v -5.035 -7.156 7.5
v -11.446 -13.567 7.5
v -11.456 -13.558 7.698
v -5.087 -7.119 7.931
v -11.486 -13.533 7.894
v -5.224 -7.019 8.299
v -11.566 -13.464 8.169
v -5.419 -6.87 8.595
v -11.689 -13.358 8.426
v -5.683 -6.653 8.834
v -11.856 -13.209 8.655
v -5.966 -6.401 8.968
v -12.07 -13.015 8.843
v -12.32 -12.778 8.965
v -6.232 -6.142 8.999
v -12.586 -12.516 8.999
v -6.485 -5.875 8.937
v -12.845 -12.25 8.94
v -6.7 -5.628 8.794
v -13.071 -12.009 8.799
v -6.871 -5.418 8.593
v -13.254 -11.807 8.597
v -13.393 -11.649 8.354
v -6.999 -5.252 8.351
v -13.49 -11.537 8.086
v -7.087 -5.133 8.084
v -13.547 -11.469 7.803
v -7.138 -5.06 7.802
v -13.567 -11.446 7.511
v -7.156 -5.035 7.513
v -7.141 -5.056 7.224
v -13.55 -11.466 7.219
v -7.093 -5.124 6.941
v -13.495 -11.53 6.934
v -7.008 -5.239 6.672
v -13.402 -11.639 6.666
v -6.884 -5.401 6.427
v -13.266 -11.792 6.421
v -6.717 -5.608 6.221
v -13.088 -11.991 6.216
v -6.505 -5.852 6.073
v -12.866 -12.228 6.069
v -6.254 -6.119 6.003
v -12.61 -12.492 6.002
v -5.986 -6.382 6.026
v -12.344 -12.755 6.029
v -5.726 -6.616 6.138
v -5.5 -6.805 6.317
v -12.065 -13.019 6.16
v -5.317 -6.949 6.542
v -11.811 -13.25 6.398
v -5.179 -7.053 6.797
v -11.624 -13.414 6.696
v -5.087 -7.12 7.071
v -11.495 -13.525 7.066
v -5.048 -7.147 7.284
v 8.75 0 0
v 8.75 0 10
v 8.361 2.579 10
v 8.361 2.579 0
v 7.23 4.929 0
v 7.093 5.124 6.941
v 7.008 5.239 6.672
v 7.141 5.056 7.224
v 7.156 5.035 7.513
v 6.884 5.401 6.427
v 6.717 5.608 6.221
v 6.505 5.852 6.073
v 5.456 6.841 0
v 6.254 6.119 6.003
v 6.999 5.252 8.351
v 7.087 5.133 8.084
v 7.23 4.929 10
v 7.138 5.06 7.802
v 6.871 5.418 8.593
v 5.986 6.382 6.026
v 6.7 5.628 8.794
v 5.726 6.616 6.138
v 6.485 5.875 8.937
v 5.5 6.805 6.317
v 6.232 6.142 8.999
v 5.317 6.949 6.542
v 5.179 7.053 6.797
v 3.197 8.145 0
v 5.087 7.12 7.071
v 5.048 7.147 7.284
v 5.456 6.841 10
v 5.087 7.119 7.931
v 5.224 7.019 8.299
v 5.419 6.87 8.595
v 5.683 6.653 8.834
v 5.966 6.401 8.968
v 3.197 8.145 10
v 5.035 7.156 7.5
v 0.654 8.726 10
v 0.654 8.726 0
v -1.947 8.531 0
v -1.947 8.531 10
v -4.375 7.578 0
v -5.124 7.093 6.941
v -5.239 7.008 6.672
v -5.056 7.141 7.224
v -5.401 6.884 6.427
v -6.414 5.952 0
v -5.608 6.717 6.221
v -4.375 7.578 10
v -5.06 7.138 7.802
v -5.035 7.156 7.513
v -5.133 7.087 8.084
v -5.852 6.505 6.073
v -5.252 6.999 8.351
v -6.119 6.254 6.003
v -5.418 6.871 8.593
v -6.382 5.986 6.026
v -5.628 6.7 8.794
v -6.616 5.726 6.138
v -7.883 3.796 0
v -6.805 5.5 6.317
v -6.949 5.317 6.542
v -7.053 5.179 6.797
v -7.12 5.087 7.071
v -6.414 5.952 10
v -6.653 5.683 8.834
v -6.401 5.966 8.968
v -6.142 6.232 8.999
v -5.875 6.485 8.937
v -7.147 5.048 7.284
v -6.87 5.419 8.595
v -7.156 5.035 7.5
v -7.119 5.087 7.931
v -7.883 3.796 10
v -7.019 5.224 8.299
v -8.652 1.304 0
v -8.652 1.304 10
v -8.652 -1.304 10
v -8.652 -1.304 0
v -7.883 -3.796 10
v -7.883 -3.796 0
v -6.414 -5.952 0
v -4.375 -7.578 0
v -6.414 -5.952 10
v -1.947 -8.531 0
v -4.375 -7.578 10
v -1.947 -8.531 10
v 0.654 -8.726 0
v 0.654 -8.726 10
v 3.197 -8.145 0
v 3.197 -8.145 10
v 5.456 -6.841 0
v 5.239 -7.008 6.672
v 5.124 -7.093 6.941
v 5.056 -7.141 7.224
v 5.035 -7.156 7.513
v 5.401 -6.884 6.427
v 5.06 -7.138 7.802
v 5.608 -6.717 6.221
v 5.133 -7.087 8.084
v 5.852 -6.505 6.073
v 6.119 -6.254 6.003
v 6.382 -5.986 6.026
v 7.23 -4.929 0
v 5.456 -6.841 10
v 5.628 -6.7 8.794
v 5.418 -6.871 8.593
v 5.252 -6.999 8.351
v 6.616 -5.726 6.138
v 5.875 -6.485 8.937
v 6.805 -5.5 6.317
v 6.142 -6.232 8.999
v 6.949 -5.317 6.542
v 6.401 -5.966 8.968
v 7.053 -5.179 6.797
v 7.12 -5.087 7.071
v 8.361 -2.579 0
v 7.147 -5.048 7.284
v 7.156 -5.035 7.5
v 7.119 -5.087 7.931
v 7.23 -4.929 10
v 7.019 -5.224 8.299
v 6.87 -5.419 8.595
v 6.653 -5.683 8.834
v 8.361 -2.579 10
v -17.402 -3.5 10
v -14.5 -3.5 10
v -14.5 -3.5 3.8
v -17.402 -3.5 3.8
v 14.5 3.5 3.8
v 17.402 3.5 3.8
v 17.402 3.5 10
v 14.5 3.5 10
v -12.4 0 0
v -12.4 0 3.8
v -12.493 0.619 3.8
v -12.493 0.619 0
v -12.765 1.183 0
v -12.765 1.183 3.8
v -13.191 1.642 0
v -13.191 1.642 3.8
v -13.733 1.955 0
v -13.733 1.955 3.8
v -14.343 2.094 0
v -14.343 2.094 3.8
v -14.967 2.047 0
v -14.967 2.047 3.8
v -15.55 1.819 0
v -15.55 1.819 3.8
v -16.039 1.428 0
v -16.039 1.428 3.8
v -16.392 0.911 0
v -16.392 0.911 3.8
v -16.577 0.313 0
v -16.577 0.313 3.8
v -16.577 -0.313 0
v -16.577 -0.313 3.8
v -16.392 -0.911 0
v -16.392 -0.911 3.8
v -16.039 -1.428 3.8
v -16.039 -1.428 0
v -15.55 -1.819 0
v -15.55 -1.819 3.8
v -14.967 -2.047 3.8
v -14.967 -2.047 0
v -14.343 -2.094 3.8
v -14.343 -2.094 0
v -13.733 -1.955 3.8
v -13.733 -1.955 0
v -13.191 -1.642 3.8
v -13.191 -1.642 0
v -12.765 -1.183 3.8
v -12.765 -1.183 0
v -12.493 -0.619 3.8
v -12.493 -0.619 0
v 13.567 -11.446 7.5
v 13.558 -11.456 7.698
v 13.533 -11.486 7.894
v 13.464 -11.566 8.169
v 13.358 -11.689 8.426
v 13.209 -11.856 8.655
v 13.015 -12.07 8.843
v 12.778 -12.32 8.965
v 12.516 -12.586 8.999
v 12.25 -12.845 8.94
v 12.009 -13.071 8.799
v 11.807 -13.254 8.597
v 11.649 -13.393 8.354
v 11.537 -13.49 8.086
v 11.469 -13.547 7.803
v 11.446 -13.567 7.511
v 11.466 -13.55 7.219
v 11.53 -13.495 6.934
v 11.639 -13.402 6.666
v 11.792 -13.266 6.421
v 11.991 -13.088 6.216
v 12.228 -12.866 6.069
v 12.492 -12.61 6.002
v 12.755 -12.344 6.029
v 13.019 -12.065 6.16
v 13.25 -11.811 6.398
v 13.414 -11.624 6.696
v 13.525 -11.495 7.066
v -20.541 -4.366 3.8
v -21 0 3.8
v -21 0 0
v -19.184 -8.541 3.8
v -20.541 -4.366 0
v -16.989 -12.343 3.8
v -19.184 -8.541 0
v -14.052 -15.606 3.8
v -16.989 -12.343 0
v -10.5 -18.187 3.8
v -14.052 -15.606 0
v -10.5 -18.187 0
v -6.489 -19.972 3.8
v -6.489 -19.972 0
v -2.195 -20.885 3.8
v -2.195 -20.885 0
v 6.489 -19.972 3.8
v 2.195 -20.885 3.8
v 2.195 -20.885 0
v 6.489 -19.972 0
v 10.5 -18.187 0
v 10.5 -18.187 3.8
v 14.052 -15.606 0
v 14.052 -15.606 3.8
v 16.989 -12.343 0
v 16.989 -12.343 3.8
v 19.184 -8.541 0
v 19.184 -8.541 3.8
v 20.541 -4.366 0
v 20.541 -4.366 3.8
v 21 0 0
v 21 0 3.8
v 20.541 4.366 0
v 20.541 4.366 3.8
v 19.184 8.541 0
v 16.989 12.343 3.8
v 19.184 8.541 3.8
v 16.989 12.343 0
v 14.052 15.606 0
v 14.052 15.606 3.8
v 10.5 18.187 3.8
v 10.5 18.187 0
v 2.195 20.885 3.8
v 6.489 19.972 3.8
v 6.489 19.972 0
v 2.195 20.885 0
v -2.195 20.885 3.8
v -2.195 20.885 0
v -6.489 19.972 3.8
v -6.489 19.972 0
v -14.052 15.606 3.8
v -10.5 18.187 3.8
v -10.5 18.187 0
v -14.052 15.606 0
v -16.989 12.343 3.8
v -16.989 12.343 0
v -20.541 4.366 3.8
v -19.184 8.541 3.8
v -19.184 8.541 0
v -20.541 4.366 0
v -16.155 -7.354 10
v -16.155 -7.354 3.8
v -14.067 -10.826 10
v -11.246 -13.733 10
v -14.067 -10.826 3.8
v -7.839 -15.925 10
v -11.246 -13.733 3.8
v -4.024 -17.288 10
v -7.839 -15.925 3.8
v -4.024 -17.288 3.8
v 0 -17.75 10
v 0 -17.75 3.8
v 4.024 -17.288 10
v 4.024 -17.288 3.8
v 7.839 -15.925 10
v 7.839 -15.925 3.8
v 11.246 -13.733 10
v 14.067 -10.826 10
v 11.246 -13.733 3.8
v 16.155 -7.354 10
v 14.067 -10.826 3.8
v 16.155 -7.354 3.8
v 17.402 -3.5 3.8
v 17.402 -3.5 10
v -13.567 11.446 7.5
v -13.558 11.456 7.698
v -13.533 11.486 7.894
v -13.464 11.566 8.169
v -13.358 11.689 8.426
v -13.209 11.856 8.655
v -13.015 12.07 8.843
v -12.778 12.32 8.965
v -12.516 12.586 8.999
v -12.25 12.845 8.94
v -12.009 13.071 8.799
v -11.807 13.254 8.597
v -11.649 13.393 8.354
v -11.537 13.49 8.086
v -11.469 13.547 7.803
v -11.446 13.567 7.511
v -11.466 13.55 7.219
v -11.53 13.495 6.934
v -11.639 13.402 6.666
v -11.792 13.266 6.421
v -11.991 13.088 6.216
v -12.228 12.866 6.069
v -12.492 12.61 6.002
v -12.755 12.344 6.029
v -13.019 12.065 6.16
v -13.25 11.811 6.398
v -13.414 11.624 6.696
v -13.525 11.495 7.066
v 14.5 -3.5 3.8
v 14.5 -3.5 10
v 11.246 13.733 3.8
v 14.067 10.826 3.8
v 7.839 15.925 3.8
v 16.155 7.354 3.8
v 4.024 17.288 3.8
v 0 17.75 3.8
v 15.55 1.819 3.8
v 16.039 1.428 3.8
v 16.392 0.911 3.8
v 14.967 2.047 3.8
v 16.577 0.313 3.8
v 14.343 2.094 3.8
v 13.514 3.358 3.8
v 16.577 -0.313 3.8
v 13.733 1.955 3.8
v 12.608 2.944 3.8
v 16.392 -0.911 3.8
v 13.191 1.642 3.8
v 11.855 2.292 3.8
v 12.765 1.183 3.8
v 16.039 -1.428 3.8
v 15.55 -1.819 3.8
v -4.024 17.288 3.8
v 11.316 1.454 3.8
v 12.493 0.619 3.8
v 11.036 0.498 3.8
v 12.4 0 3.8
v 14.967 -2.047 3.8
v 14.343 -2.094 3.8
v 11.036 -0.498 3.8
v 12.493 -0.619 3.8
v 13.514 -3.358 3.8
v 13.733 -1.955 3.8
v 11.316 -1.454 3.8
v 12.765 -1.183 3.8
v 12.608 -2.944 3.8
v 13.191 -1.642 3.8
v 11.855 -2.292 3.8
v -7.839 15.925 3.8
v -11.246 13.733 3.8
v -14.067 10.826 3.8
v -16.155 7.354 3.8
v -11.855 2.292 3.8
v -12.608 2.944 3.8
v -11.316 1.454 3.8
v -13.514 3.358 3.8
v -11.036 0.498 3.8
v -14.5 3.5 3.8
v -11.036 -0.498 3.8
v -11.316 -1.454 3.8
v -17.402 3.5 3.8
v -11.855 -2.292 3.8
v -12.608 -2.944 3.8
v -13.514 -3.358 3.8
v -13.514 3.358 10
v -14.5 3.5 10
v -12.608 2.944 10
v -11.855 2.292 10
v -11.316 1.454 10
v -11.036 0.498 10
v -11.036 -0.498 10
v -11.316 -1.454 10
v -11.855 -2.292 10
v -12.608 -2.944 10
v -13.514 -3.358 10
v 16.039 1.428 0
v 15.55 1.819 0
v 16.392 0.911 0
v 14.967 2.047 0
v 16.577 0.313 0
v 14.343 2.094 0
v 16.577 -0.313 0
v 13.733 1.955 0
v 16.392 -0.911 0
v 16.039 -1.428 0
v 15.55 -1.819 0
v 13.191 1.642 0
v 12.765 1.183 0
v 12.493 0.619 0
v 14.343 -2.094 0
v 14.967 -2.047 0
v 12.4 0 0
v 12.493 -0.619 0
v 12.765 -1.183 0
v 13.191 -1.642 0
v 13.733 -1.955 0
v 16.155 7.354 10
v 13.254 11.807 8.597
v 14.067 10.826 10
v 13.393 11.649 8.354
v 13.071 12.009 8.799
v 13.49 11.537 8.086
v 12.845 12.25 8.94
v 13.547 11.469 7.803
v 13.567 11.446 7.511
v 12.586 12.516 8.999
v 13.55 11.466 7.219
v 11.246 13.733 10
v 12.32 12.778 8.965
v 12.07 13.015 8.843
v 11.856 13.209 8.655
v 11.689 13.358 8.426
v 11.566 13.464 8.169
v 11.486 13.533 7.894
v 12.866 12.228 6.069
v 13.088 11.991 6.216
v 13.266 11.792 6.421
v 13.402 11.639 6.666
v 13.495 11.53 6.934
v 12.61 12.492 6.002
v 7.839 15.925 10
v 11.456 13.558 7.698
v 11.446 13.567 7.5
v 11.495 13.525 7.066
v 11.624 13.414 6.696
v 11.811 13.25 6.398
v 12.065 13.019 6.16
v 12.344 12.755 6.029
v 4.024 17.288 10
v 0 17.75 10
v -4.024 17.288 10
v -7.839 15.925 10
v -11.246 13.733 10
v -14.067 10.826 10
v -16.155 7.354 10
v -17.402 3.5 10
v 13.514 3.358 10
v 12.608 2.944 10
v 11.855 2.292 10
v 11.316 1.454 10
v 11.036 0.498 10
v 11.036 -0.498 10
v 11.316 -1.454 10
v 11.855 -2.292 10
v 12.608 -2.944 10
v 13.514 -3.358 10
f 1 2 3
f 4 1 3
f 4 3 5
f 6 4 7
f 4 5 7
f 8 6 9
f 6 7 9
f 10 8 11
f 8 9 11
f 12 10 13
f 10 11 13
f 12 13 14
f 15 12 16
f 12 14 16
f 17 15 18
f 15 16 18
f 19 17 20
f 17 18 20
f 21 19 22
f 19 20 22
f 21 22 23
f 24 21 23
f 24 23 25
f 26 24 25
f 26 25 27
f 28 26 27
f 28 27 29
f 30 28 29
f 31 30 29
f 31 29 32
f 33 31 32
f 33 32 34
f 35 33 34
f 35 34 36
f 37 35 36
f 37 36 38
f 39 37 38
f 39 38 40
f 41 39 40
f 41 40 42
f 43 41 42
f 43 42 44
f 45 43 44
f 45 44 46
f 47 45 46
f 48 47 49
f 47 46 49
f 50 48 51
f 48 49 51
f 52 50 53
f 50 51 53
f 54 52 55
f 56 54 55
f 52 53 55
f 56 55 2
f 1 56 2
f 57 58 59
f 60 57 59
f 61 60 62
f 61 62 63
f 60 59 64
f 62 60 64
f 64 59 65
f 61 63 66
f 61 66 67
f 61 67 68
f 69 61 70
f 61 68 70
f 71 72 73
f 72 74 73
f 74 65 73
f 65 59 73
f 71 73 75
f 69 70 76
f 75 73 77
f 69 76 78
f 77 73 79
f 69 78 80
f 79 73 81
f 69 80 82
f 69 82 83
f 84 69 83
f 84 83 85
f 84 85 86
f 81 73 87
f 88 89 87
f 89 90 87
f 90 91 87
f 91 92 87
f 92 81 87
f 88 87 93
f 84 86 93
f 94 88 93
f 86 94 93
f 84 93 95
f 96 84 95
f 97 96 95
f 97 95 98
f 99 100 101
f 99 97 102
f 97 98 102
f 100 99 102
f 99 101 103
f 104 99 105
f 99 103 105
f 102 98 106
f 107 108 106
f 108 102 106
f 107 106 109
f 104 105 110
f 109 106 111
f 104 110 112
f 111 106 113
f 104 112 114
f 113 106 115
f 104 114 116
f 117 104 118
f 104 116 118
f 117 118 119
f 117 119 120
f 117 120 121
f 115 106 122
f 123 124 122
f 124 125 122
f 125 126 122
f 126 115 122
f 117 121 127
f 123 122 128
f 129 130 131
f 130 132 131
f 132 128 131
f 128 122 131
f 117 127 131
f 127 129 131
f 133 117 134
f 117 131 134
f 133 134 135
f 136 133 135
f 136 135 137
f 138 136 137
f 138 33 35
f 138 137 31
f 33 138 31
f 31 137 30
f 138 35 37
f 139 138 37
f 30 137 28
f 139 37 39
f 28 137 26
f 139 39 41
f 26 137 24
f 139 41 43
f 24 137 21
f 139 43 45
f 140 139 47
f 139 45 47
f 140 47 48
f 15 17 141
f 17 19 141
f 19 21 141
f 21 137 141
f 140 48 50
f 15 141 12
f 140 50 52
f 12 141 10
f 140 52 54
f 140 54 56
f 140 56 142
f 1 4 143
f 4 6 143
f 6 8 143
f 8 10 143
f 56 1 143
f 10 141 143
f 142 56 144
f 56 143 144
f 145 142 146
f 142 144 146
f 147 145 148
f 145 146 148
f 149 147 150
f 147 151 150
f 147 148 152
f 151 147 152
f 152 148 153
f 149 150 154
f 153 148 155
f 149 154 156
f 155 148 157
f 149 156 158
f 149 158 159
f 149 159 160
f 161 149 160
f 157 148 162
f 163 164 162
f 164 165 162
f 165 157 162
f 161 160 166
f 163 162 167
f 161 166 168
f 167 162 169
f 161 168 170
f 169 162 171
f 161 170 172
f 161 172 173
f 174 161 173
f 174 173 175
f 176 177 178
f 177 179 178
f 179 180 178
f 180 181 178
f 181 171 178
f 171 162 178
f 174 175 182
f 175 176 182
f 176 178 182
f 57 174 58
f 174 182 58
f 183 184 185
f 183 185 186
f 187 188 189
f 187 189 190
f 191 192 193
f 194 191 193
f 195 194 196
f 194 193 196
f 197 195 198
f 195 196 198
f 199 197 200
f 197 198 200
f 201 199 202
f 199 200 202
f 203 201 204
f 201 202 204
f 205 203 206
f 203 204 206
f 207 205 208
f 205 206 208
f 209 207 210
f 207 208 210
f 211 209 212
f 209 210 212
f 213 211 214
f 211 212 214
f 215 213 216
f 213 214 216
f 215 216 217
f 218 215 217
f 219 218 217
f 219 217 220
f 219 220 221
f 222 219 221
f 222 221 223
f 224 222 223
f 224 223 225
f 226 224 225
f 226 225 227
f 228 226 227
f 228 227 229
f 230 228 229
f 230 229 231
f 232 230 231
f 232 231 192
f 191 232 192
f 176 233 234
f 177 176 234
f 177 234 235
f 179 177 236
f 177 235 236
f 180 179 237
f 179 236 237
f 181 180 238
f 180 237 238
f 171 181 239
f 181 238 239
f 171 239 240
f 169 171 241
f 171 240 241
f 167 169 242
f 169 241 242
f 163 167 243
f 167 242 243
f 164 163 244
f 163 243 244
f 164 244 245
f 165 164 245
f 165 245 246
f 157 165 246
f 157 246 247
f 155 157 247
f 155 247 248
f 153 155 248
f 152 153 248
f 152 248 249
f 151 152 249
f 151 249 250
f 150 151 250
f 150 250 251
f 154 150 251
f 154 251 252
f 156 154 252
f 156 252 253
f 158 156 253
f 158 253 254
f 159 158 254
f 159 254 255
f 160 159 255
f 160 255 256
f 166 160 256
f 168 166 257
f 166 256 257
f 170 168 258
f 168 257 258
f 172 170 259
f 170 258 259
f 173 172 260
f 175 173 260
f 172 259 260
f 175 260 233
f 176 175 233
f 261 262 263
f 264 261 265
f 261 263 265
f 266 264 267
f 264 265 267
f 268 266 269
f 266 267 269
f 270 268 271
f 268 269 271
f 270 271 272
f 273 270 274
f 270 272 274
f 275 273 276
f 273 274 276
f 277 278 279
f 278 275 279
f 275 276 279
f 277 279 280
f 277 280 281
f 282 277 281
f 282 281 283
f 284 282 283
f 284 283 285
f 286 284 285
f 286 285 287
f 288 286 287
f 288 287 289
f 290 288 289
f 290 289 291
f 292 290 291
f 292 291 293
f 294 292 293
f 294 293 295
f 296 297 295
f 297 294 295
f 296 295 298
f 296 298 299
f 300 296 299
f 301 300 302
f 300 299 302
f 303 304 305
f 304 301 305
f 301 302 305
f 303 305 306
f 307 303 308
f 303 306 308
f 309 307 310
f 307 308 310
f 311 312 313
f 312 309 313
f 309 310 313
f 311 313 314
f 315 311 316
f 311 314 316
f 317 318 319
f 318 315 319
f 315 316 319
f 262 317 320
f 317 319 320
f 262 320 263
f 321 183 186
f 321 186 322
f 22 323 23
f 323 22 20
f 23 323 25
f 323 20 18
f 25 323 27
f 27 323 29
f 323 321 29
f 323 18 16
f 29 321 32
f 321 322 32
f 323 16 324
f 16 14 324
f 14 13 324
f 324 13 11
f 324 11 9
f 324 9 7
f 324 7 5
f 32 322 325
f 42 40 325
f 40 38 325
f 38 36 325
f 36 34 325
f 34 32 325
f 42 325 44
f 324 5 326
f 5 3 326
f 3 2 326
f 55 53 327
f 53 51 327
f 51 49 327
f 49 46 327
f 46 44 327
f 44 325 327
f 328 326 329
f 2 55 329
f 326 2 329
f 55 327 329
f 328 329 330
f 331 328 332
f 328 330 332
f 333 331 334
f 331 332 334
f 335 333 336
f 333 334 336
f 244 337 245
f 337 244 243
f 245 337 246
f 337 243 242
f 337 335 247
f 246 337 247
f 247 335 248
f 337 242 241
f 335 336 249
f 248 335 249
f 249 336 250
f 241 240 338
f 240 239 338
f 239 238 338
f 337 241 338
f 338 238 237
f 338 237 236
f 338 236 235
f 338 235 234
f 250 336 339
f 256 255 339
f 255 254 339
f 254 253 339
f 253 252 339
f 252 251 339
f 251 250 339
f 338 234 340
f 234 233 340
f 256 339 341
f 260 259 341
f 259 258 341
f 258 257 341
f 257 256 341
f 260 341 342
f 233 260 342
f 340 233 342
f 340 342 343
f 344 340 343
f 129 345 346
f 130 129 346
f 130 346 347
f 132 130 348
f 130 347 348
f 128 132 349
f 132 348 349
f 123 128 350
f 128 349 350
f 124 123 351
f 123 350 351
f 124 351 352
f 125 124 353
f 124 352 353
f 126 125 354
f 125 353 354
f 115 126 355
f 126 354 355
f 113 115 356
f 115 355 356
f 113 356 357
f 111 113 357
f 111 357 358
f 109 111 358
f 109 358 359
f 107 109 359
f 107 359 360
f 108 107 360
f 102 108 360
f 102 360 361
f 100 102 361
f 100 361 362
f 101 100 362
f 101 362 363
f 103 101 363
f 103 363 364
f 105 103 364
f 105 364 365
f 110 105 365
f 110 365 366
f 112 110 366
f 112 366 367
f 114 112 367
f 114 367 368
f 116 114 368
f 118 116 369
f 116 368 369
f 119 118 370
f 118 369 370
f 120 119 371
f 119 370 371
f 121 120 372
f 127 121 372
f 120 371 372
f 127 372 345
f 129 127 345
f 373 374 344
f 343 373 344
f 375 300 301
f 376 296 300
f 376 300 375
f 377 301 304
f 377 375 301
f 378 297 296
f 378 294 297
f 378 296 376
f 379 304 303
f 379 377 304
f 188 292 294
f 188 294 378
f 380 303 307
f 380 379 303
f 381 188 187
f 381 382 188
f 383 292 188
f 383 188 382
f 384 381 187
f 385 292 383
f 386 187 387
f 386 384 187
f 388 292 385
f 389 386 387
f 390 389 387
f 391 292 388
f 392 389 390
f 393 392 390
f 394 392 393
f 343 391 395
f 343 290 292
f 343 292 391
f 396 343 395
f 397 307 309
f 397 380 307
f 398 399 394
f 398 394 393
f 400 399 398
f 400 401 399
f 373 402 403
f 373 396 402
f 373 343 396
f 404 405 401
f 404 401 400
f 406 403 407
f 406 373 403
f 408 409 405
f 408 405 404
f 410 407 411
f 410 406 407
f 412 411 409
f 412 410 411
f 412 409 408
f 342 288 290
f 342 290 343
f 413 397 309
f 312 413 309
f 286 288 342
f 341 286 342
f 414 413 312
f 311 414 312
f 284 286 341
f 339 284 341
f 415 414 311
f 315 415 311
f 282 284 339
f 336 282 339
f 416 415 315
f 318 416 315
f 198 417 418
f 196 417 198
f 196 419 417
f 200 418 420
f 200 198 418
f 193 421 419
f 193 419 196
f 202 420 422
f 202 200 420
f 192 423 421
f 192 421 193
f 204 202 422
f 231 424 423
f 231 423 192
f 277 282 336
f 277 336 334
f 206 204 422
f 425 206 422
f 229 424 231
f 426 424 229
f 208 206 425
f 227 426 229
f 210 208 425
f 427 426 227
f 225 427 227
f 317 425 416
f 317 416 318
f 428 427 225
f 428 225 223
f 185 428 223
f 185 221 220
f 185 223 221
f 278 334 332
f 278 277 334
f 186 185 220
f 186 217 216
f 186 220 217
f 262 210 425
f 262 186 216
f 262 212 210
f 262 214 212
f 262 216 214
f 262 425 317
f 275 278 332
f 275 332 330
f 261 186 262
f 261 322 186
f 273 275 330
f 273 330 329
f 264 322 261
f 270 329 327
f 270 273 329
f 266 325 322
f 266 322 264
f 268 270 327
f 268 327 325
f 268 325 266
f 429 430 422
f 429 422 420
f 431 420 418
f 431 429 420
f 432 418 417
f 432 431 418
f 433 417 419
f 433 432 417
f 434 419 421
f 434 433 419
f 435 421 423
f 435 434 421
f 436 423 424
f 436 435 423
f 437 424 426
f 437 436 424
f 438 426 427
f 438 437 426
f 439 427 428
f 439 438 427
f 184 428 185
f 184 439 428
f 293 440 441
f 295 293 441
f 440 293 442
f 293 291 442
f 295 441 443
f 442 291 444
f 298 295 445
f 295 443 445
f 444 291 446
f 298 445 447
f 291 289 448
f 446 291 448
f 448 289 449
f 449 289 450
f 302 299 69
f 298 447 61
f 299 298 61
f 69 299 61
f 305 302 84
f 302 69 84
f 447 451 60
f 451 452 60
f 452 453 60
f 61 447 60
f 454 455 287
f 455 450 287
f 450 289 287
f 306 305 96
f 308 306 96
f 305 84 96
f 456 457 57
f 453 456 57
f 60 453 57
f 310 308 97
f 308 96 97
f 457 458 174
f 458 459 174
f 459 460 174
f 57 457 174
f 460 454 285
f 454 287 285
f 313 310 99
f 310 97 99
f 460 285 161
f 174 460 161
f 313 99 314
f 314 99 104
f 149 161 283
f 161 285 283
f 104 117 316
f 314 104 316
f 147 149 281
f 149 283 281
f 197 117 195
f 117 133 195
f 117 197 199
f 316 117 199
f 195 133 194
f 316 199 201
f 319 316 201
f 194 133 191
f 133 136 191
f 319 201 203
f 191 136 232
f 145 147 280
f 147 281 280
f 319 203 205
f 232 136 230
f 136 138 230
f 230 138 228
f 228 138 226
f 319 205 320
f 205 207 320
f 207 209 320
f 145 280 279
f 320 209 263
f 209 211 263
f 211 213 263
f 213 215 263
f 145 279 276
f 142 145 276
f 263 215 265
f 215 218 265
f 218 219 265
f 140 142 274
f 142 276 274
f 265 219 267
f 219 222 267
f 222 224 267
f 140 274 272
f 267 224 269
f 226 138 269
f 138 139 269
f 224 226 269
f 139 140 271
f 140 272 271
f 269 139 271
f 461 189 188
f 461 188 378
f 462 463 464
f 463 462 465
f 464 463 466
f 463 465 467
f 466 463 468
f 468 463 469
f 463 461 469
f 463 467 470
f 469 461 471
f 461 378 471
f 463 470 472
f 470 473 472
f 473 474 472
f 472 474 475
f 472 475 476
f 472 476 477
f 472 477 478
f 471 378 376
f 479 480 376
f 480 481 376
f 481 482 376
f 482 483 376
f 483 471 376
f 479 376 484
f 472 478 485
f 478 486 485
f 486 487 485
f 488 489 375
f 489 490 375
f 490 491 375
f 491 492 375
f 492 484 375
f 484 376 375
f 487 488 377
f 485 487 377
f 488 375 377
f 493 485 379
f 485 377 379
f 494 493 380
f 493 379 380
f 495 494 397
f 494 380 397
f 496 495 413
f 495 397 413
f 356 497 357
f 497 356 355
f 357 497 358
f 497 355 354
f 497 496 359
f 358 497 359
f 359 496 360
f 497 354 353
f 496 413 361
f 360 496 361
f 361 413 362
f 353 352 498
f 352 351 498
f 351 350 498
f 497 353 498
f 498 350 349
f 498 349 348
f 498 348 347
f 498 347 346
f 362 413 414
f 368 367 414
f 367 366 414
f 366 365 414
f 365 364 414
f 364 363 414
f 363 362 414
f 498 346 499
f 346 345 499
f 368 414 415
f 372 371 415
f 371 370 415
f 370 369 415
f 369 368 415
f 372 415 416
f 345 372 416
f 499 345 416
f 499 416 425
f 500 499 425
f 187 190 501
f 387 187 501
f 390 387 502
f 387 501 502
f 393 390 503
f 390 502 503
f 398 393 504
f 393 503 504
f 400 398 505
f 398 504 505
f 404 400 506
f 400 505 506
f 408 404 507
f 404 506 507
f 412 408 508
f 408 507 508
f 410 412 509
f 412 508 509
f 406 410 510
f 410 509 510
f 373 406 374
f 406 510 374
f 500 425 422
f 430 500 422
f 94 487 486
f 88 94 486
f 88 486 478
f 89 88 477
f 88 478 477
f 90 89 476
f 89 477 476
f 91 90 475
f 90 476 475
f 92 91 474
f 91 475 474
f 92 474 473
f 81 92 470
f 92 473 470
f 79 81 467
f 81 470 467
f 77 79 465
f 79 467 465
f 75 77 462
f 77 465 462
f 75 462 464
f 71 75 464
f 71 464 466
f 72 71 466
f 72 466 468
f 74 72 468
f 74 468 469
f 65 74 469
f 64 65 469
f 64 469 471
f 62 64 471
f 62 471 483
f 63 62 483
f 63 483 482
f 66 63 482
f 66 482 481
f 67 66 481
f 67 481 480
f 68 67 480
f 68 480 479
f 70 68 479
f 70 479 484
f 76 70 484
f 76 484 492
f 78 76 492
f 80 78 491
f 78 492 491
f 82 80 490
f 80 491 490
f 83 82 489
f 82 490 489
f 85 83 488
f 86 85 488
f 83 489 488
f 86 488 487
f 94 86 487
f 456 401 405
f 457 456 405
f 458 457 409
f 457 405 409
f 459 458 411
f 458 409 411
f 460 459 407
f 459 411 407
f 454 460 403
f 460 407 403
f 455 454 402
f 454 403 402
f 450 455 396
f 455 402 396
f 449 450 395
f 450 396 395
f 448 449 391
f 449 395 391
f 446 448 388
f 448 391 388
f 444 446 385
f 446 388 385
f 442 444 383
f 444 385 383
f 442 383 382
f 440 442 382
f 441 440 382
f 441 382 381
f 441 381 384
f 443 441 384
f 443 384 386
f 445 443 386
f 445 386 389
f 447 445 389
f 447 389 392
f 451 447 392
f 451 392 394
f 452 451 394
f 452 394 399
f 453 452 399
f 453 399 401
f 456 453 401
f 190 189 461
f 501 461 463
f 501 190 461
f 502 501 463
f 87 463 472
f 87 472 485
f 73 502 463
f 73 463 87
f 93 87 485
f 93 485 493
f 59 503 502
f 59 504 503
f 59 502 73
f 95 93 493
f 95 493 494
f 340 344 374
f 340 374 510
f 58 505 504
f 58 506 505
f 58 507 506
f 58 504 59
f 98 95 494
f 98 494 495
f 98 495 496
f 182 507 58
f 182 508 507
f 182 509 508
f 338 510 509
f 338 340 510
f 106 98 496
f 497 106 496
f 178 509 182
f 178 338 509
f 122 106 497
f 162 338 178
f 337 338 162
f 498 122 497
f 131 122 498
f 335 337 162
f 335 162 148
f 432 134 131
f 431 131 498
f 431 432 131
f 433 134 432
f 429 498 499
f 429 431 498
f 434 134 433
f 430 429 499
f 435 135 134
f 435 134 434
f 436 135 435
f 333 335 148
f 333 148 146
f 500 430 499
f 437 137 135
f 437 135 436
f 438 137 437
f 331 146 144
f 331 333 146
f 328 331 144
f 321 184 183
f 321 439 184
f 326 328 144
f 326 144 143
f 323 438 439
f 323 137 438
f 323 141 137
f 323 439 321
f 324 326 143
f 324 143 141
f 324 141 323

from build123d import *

# Parameters (mm, degrees)
SKETCH_1_R               = 21
EXTRUDE_1_DEPTH          = 3.8
SKETCH_2_R               = 17.75
EXTRUDE_2_DEPTH          = 6.2
SKETCH_3_R               = 2.1
SKETCH_3_R_2             = 8.75
CUT_EXTRUDE_1_DEPTH      = 32.336879232
CUT_EXTRUDE_2_REACH      = 50.491
CUT_EXTRUDE_2_END_RADIUS = 8.75
SKETCH_5_R               = 1.5
PATTERN_CIRCULAR_1_COUNT = 4
CUT_EXTRUDE_3_DEPTH      = 6.2


with BuildPart() as part:
    # ｽｹｯﾁ1 → ﾎﾞｽ - 押し出し1 (new body)
    with BuildSketch(Plane.XY):
        with Locations(Location((0, 0, 0), (0, 0, 180))):
            Circle(SKETCH_1_R)
    extrude(amount=EXTRUDE_1_DEPTH)

    # ｽｹｯﾁ2 → ﾎﾞｽ - 押し出し2 (add)
    with BuildSketch(Plane.XY.offset(3.8)):
        with Locations(Location((0, 0, 0), (0, 0, 180))):
            Circle(SKETCH_2_R)
    extrude(amount=EXTRUDE_2_DEPTH)

    # ｽｹｯﾁ3 → ｶｯﾄ - 押し出し1 (cut, through all)
    with BuildSketch(Plane.XY.offset(10)):
        with Locations((-14.5, 0)):
            Circle(SKETCH_3_R)
        with Locations(Location((14.5, 0, 0), (0, 0, 180))):
            Circle(SKETCH_3_R)
        Circle(SKETCH_3_R_2)
    extrude(amount=-CUT_EXTRUDE_1_DEPTH, mode=Mode.SUBTRACT)

    # ｶｯﾄ - 押し出し2: up to this cylinder (the profile starts outside it)
    cut_extrude_2_end = Plane(origin=(0, 0, 7.5), z_dir=(0, 0, 1)) * Cylinder(CUT_EXTRUDE_2_END_RADIUS, 119.482, mode=Mode.PRIVATE)
    # ｽｹｯﾁ5 → ｶｯﾄ - 押し出し2 (cut, up to the surface)
    with BuildSketch(Plane(origin=(12.551145366, 12.551145366, 0), x_dir=(0.7071067811865489, -0.7071067811865461, 0), z_dir=(0.7071067811865461, 0.7071067811865489, 0)), mode=Mode.PRIVATE) as cut_extrude_2_sk1:
        with Locations(Location((0, -7.5, 0), (0, 0, 180))):
            Circle(SKETCH_5_R)
    cut_extrude_2_tool1 = extrude(cut_extrude_2_sk1.sketch, amount=-CUT_EXTRUDE_2_REACH, mode=Mode.PRIVATE) - cut_extrude_2_end
    cut_extrude_2 = cut_extrude_2_tool1.solids().sort_by_distance((12.551145, 12.551145, 7.5))[0]
    add(cut_extrude_2, mode=Mode.SUBTRACT)

    # 円形ﾊﾟﾀｰﾝ1: ｶｯﾄ - 押し出し2 ×4 about axis
    pattern_circular_1_axis = Axis((0, 0, 10), (0, 0, -1))
    for i in range(1, PATTERN_CIRCULAR_1_COUNT):
        add(cut_extrude_2.rotate(pattern_circular_1_axis, i * 360 / PATTERN_CIRCULAR_1_COUNT), mode=Mode.SUBTRACT)

    # ｽｹｯﾁ6 → ｶｯﾄ - 押し出し3 (cut)
    with BuildSketch(Plane.XY.offset(10)):
        with BuildLine():
            Line((-14.5, -3.5), (-17.75, -3.5))
            ThreePointArc((-17.75, -3.5), (-21.25, 0), (-17.75, 3.5))
            Line((-17.75, 3.5), (-14.5, 3.5))
            ThreePointArc((-14.5, 3.5), (-11, 0), (-14.5, -3.5))
        make_face()
        with BuildLine():
            Line((14.5, -3.5), (17.75, -3.5))
            ThreePointArc((17.75, -3.5), (21.25, 0), (17.75, 3.5))
            Line((17.75, 3.5), (14.5, 3.5))
            ThreePointArc((14.5, 3.5), (11, 0), (14.5, -3.5))
        make_face()
    extrude(amount=-CUT_EXTRUDE_3_DEPTH, mode=Mode.SUBTRACT)


solid = part.part
